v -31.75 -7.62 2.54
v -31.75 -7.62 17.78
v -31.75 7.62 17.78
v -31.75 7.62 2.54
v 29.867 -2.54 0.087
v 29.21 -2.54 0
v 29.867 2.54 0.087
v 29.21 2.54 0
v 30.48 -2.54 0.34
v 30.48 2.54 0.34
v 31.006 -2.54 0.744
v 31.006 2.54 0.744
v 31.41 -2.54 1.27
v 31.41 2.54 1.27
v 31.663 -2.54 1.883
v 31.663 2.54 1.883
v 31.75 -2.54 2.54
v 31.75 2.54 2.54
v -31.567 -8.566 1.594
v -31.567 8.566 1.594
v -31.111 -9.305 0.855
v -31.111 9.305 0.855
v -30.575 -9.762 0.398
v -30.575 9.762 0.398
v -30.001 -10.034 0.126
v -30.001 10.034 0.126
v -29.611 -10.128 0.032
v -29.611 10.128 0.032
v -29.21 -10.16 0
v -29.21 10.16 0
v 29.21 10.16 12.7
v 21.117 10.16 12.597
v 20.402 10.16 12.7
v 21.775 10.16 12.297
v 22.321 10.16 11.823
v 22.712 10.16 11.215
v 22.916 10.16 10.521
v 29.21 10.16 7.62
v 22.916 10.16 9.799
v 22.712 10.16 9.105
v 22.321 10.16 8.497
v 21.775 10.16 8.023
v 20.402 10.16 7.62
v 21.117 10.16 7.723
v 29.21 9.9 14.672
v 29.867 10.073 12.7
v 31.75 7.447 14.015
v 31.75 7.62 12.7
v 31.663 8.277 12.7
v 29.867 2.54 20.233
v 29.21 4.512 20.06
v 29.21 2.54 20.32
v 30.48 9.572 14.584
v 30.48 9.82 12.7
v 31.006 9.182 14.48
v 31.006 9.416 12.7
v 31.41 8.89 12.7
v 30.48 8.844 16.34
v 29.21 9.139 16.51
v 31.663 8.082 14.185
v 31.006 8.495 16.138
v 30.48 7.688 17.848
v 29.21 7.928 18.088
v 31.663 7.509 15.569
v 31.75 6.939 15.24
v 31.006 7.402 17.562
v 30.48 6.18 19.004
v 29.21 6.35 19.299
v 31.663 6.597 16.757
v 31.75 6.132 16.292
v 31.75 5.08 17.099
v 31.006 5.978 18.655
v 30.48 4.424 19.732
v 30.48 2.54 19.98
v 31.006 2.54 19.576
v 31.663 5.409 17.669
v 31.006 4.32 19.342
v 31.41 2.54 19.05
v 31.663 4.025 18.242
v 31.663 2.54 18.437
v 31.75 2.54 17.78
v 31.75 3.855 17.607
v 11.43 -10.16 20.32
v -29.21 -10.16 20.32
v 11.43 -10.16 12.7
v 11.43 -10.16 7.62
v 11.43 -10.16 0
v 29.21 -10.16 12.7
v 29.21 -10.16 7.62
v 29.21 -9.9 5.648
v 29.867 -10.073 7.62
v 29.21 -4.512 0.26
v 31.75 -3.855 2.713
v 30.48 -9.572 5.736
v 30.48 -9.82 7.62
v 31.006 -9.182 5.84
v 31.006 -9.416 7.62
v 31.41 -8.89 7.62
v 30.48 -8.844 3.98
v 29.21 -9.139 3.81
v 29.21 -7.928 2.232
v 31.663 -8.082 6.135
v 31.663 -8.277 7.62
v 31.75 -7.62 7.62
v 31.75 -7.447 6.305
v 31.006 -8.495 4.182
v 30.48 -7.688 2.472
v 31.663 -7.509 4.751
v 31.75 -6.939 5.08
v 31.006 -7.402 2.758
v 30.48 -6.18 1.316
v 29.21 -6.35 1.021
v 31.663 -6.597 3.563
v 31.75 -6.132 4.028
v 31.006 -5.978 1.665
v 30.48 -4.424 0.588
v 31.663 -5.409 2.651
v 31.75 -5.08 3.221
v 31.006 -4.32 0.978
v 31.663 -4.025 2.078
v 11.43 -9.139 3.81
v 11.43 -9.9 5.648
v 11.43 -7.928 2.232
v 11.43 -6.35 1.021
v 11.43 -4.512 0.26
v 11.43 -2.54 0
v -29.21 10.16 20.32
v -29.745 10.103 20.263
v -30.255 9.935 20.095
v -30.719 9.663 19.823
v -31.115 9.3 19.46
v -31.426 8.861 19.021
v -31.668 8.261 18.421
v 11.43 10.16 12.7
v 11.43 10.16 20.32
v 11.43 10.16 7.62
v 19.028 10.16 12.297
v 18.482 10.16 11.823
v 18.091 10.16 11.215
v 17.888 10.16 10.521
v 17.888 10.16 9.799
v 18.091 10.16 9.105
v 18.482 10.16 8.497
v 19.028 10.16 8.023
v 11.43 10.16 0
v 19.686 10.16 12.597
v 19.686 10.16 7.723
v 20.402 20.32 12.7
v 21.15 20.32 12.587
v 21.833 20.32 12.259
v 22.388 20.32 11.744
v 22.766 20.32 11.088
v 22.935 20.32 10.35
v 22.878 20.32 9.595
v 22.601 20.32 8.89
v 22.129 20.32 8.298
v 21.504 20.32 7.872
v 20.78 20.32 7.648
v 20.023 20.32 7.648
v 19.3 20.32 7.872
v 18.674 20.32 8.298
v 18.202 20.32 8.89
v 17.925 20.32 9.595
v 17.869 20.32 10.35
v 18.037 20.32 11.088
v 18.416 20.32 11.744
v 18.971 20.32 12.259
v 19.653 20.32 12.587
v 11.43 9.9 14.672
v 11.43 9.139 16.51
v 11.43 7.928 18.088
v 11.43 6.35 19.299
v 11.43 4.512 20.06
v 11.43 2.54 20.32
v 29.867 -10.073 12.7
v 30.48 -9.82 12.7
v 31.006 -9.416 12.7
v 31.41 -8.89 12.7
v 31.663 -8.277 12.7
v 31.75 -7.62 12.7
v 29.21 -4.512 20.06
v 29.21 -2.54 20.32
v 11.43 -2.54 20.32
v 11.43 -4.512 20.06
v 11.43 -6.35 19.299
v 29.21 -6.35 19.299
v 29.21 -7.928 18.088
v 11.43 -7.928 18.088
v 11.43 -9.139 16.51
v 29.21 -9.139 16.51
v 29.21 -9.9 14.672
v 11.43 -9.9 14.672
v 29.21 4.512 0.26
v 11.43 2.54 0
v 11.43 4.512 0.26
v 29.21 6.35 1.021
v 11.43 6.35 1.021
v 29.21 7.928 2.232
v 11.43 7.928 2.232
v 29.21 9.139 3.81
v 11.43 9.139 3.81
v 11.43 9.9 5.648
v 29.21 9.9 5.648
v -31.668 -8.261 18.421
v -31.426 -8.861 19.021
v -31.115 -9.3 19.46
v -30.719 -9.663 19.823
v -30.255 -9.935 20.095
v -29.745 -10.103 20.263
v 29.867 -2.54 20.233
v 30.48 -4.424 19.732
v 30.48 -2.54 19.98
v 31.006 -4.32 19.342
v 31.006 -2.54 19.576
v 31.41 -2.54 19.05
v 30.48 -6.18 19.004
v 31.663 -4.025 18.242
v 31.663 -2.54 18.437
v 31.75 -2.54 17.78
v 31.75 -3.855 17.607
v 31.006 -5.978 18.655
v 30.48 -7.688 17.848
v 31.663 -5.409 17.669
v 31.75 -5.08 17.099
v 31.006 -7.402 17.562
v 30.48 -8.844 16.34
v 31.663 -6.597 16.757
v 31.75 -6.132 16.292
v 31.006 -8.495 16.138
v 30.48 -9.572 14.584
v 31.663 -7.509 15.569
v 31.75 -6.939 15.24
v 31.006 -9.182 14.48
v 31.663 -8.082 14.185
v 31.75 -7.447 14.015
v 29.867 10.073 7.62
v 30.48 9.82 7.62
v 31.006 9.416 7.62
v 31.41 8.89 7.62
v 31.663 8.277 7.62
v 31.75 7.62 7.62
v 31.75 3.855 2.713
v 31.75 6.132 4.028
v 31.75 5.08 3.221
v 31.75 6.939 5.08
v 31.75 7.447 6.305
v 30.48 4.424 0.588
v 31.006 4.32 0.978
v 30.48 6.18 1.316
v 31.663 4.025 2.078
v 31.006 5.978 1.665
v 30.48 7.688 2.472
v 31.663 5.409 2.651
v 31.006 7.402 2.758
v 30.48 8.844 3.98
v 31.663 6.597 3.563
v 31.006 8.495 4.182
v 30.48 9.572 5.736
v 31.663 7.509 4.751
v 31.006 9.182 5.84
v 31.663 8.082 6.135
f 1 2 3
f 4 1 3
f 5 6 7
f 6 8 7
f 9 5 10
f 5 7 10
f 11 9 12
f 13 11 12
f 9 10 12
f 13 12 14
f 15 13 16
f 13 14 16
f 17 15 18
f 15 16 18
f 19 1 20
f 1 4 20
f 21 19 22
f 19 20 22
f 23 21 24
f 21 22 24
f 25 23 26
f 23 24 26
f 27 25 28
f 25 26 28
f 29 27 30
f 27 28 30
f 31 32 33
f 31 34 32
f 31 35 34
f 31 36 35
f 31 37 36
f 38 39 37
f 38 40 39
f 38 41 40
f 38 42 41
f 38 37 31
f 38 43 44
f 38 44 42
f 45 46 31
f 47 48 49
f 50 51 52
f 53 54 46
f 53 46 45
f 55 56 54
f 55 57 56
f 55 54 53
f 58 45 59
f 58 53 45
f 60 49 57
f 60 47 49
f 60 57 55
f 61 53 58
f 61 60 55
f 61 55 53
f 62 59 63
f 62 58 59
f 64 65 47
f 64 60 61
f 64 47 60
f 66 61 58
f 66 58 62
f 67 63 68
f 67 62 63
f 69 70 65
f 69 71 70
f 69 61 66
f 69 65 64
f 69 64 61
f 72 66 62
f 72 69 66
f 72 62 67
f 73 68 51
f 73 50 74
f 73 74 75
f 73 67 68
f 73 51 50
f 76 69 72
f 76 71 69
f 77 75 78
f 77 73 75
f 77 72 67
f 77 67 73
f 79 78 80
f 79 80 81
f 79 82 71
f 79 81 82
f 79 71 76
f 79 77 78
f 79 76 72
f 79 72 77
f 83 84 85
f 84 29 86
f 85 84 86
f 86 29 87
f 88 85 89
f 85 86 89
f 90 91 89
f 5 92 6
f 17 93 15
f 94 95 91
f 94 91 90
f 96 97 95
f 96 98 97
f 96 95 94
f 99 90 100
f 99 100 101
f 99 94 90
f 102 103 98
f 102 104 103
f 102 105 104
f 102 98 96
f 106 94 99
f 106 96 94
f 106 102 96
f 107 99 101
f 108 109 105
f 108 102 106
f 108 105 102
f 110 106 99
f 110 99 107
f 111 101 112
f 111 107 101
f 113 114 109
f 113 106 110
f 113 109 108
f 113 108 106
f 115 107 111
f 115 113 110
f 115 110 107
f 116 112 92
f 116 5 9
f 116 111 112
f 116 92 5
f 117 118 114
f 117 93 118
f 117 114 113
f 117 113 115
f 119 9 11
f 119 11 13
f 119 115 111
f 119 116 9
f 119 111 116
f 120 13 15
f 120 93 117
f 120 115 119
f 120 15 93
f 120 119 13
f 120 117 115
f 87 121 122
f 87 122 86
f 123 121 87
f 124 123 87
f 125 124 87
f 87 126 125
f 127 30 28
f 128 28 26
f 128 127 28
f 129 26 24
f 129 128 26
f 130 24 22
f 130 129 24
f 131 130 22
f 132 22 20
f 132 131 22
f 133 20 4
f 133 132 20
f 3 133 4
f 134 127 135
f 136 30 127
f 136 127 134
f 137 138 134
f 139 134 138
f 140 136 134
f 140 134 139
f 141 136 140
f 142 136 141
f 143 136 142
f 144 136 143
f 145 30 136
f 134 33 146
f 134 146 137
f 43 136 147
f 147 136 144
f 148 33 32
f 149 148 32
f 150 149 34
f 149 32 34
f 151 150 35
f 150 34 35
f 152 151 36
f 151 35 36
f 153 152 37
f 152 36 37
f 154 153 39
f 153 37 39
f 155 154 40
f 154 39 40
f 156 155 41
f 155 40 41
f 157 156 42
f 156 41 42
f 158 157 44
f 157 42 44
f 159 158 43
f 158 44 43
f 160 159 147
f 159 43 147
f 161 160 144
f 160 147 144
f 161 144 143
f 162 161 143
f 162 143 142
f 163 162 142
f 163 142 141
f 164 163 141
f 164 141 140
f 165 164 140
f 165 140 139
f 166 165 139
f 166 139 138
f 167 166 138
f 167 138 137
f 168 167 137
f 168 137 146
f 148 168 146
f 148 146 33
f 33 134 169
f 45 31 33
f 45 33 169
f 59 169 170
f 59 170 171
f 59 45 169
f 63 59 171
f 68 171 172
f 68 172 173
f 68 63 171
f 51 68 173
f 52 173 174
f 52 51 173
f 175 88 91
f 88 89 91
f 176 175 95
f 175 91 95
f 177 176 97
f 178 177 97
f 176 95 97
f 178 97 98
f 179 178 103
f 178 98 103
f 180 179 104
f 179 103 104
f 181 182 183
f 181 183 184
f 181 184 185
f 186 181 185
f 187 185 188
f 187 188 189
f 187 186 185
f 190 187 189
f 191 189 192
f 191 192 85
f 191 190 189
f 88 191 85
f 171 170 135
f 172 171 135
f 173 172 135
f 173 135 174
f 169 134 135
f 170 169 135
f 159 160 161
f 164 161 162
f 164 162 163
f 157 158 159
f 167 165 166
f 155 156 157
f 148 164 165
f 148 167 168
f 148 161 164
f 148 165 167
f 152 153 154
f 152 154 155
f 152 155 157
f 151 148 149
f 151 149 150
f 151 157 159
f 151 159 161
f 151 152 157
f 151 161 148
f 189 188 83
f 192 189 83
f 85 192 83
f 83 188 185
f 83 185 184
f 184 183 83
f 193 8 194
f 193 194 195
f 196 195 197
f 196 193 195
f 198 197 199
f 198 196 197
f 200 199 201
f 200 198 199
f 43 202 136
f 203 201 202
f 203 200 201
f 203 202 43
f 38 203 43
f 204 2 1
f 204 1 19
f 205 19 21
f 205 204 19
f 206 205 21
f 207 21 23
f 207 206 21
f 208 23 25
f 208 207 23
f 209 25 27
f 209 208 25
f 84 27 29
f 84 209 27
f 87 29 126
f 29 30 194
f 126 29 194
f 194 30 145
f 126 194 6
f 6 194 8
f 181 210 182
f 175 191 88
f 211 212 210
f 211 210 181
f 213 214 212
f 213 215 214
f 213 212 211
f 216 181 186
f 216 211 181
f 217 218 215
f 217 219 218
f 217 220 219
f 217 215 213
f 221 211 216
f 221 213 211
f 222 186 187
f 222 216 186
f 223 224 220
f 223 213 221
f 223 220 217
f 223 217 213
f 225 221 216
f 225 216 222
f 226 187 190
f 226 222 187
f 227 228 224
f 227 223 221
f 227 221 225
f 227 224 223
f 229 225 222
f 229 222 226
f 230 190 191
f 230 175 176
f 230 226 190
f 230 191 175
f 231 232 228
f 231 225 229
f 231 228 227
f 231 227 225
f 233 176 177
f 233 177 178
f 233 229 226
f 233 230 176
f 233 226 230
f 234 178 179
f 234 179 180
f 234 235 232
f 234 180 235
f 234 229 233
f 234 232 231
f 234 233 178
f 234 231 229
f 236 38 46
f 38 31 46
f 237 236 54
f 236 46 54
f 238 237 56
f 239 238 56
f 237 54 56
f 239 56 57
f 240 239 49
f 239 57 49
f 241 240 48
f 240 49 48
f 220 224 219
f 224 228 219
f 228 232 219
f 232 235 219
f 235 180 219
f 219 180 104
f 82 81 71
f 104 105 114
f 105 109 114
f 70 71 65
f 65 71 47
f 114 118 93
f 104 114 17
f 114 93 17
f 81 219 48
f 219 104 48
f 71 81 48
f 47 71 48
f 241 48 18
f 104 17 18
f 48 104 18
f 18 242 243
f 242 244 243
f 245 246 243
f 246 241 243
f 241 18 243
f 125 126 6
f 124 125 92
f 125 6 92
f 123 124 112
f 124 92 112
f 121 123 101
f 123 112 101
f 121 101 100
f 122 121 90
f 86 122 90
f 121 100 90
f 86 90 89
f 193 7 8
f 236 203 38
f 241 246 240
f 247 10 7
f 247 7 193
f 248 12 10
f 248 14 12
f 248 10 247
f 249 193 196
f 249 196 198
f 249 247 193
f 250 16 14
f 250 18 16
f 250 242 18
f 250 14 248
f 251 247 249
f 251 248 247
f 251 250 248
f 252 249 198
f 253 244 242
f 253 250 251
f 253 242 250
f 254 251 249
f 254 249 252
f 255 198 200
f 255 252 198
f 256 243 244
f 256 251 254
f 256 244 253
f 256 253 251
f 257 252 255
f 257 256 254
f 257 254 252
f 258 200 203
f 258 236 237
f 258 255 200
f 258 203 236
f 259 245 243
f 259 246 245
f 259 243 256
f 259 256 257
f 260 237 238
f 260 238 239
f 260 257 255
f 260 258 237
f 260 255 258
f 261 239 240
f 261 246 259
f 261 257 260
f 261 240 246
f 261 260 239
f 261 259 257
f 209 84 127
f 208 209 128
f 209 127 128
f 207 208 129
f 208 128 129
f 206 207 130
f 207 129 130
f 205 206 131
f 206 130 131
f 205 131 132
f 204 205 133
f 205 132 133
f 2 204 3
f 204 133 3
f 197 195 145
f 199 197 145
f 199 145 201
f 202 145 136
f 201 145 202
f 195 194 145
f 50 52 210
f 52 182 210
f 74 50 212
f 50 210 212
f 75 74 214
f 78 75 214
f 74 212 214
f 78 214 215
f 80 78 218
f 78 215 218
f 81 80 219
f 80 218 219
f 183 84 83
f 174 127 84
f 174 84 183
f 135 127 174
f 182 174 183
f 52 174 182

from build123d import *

# Parameters (mm, degrees)
SKETCH1_W           = 63.5
SKETCH1_H           = 20.32
BOSS_EXTRUDE1_DEPTH = 20.32
CUT_EXTRUDE2_DEPTH  = 20.32
FILLET1_R           = 2.54
SKETCH3_R           = 2.54
BOSS_EXTRUDE2_DEPTH = 15.24
FILLET2_R           = 2.54
CUT_EXTRUDE3_START  = -5.08
SKETCH4_R           = 2.54
CUT_EXTRUDE3_DEPTH  = 5.08


with BuildPart() as part:
    # Sketch1 → Boss-Extrude1 (new body)
    with BuildSketch(Plane.XY):
        Rectangle(SKETCH1_W, SKETCH1_H)
    extrude(amount=BOSS_EXTRUDE1_DEPTH)

    # Sketch2 → Cut-Extrude2 (cut)
    with BuildSketch(Plane(origin=(31.75, 0, 0), x_dir=(0, 0, -1), z_dir=(1, 0, 0))):
        with BuildLine():
            Line((-20.32, 2.54), (-20.32, 10.16))
            Line((-20.32, 10.16), (-12.7, 10.16))
            ThreePointArc((-12.7, 10.16), (-18.088153673, 7.928153673), (-20.32, 2.54))
        make_face()
        with BuildLine():
            Line((-7.62, 10.16), (0, 10.16))
            Line((0, 10.16), (0, 2.54))
            ThreePointArc((0, 2.54), (-2.231846327, 7.928153673), (-7.62, 10.16))
        make_face()
        with BuildLine():
            Line((-7.62, -10.16), (0, -10.16))
            Line((0, -10.16), (0, -2.54))
            ThreePointArc((0, -2.54), (-2.231846327, -7.928153673), (-7.62, -10.16))
        make_face()
        with BuildLine():
            Line((-12.7, -10.16), (-20.32, -10.16))
            Line((-20.32, -10.16), (-20.32, -2.54))
            ThreePointArc((-20.32, -2.54), (-18.088153673, -7.928153673), (-12.7, -10.16))
        make_face()
    extrude(amount=-CUT_EXTRUDE2_DEPTH, mode=Mode.SUBTRACT)

    # Fillet1
    fillet1_edges = [part.edges().sort_by_distance(p)[0] for p in [
        (31.75, 0, 0),
        (31.75, 0, 20.32),
        (31.75, -10.16, 10.16),
        (31.75, 10.16, 10.16),
        (31.75, -7.928153673, 18.088153673),
        (31.75, -7.928153673, 2.231846327),
        (31.75, 7.928153673, 2.231846327),
        (31.75, 7.928153673, 18.088153673),
    ]]
    fillet(fillet1_edges, radius=FILLET1_R)

    # Sketch3 → Boss-Extrude2 (add)
    with BuildSketch(Plane(origin=(0, 10.16, 0), x_dir=(1, 0, 0), z_dir=(0, 1, 0))):
        with Locations(Location((20.4017153, -10.16, 0), (0, 0, 270))):
            Circle(SKETCH3_R)
    extrude(amount=BOSS_EXTRUDE2_DEPTH)

    # Fillet2
    fillet2_edges = [part.edges().sort_by_distance(p)[0] for p in [
        (-31.75, 0, 20.32),
        (-31.75, 0, 0),
        (-31.75, -10.16, 10.16),
        (-31.75, 10.16, 10.16),
    ]]
    fillet(fillet2_edges, radius=FILLET2_R)

    # Sketch4 → Cut-Extrude3 (cut)
    with BuildSketch(Plane(origin=(0, 25.4, 0), x_dir=(1, 0, 0), z_dir=(0, 1, 0)).offset(CUT_EXTRUDE3_START)):
        with Locations(Location((20.4017153, -10.16, 0), (0, 0, 270))):
            Circle(SKETCH4_R)
    extrude(amount=CUT_EXTRUDE3_DEPTH, mode=Mode.SUBTRACT)


solid = part.part
